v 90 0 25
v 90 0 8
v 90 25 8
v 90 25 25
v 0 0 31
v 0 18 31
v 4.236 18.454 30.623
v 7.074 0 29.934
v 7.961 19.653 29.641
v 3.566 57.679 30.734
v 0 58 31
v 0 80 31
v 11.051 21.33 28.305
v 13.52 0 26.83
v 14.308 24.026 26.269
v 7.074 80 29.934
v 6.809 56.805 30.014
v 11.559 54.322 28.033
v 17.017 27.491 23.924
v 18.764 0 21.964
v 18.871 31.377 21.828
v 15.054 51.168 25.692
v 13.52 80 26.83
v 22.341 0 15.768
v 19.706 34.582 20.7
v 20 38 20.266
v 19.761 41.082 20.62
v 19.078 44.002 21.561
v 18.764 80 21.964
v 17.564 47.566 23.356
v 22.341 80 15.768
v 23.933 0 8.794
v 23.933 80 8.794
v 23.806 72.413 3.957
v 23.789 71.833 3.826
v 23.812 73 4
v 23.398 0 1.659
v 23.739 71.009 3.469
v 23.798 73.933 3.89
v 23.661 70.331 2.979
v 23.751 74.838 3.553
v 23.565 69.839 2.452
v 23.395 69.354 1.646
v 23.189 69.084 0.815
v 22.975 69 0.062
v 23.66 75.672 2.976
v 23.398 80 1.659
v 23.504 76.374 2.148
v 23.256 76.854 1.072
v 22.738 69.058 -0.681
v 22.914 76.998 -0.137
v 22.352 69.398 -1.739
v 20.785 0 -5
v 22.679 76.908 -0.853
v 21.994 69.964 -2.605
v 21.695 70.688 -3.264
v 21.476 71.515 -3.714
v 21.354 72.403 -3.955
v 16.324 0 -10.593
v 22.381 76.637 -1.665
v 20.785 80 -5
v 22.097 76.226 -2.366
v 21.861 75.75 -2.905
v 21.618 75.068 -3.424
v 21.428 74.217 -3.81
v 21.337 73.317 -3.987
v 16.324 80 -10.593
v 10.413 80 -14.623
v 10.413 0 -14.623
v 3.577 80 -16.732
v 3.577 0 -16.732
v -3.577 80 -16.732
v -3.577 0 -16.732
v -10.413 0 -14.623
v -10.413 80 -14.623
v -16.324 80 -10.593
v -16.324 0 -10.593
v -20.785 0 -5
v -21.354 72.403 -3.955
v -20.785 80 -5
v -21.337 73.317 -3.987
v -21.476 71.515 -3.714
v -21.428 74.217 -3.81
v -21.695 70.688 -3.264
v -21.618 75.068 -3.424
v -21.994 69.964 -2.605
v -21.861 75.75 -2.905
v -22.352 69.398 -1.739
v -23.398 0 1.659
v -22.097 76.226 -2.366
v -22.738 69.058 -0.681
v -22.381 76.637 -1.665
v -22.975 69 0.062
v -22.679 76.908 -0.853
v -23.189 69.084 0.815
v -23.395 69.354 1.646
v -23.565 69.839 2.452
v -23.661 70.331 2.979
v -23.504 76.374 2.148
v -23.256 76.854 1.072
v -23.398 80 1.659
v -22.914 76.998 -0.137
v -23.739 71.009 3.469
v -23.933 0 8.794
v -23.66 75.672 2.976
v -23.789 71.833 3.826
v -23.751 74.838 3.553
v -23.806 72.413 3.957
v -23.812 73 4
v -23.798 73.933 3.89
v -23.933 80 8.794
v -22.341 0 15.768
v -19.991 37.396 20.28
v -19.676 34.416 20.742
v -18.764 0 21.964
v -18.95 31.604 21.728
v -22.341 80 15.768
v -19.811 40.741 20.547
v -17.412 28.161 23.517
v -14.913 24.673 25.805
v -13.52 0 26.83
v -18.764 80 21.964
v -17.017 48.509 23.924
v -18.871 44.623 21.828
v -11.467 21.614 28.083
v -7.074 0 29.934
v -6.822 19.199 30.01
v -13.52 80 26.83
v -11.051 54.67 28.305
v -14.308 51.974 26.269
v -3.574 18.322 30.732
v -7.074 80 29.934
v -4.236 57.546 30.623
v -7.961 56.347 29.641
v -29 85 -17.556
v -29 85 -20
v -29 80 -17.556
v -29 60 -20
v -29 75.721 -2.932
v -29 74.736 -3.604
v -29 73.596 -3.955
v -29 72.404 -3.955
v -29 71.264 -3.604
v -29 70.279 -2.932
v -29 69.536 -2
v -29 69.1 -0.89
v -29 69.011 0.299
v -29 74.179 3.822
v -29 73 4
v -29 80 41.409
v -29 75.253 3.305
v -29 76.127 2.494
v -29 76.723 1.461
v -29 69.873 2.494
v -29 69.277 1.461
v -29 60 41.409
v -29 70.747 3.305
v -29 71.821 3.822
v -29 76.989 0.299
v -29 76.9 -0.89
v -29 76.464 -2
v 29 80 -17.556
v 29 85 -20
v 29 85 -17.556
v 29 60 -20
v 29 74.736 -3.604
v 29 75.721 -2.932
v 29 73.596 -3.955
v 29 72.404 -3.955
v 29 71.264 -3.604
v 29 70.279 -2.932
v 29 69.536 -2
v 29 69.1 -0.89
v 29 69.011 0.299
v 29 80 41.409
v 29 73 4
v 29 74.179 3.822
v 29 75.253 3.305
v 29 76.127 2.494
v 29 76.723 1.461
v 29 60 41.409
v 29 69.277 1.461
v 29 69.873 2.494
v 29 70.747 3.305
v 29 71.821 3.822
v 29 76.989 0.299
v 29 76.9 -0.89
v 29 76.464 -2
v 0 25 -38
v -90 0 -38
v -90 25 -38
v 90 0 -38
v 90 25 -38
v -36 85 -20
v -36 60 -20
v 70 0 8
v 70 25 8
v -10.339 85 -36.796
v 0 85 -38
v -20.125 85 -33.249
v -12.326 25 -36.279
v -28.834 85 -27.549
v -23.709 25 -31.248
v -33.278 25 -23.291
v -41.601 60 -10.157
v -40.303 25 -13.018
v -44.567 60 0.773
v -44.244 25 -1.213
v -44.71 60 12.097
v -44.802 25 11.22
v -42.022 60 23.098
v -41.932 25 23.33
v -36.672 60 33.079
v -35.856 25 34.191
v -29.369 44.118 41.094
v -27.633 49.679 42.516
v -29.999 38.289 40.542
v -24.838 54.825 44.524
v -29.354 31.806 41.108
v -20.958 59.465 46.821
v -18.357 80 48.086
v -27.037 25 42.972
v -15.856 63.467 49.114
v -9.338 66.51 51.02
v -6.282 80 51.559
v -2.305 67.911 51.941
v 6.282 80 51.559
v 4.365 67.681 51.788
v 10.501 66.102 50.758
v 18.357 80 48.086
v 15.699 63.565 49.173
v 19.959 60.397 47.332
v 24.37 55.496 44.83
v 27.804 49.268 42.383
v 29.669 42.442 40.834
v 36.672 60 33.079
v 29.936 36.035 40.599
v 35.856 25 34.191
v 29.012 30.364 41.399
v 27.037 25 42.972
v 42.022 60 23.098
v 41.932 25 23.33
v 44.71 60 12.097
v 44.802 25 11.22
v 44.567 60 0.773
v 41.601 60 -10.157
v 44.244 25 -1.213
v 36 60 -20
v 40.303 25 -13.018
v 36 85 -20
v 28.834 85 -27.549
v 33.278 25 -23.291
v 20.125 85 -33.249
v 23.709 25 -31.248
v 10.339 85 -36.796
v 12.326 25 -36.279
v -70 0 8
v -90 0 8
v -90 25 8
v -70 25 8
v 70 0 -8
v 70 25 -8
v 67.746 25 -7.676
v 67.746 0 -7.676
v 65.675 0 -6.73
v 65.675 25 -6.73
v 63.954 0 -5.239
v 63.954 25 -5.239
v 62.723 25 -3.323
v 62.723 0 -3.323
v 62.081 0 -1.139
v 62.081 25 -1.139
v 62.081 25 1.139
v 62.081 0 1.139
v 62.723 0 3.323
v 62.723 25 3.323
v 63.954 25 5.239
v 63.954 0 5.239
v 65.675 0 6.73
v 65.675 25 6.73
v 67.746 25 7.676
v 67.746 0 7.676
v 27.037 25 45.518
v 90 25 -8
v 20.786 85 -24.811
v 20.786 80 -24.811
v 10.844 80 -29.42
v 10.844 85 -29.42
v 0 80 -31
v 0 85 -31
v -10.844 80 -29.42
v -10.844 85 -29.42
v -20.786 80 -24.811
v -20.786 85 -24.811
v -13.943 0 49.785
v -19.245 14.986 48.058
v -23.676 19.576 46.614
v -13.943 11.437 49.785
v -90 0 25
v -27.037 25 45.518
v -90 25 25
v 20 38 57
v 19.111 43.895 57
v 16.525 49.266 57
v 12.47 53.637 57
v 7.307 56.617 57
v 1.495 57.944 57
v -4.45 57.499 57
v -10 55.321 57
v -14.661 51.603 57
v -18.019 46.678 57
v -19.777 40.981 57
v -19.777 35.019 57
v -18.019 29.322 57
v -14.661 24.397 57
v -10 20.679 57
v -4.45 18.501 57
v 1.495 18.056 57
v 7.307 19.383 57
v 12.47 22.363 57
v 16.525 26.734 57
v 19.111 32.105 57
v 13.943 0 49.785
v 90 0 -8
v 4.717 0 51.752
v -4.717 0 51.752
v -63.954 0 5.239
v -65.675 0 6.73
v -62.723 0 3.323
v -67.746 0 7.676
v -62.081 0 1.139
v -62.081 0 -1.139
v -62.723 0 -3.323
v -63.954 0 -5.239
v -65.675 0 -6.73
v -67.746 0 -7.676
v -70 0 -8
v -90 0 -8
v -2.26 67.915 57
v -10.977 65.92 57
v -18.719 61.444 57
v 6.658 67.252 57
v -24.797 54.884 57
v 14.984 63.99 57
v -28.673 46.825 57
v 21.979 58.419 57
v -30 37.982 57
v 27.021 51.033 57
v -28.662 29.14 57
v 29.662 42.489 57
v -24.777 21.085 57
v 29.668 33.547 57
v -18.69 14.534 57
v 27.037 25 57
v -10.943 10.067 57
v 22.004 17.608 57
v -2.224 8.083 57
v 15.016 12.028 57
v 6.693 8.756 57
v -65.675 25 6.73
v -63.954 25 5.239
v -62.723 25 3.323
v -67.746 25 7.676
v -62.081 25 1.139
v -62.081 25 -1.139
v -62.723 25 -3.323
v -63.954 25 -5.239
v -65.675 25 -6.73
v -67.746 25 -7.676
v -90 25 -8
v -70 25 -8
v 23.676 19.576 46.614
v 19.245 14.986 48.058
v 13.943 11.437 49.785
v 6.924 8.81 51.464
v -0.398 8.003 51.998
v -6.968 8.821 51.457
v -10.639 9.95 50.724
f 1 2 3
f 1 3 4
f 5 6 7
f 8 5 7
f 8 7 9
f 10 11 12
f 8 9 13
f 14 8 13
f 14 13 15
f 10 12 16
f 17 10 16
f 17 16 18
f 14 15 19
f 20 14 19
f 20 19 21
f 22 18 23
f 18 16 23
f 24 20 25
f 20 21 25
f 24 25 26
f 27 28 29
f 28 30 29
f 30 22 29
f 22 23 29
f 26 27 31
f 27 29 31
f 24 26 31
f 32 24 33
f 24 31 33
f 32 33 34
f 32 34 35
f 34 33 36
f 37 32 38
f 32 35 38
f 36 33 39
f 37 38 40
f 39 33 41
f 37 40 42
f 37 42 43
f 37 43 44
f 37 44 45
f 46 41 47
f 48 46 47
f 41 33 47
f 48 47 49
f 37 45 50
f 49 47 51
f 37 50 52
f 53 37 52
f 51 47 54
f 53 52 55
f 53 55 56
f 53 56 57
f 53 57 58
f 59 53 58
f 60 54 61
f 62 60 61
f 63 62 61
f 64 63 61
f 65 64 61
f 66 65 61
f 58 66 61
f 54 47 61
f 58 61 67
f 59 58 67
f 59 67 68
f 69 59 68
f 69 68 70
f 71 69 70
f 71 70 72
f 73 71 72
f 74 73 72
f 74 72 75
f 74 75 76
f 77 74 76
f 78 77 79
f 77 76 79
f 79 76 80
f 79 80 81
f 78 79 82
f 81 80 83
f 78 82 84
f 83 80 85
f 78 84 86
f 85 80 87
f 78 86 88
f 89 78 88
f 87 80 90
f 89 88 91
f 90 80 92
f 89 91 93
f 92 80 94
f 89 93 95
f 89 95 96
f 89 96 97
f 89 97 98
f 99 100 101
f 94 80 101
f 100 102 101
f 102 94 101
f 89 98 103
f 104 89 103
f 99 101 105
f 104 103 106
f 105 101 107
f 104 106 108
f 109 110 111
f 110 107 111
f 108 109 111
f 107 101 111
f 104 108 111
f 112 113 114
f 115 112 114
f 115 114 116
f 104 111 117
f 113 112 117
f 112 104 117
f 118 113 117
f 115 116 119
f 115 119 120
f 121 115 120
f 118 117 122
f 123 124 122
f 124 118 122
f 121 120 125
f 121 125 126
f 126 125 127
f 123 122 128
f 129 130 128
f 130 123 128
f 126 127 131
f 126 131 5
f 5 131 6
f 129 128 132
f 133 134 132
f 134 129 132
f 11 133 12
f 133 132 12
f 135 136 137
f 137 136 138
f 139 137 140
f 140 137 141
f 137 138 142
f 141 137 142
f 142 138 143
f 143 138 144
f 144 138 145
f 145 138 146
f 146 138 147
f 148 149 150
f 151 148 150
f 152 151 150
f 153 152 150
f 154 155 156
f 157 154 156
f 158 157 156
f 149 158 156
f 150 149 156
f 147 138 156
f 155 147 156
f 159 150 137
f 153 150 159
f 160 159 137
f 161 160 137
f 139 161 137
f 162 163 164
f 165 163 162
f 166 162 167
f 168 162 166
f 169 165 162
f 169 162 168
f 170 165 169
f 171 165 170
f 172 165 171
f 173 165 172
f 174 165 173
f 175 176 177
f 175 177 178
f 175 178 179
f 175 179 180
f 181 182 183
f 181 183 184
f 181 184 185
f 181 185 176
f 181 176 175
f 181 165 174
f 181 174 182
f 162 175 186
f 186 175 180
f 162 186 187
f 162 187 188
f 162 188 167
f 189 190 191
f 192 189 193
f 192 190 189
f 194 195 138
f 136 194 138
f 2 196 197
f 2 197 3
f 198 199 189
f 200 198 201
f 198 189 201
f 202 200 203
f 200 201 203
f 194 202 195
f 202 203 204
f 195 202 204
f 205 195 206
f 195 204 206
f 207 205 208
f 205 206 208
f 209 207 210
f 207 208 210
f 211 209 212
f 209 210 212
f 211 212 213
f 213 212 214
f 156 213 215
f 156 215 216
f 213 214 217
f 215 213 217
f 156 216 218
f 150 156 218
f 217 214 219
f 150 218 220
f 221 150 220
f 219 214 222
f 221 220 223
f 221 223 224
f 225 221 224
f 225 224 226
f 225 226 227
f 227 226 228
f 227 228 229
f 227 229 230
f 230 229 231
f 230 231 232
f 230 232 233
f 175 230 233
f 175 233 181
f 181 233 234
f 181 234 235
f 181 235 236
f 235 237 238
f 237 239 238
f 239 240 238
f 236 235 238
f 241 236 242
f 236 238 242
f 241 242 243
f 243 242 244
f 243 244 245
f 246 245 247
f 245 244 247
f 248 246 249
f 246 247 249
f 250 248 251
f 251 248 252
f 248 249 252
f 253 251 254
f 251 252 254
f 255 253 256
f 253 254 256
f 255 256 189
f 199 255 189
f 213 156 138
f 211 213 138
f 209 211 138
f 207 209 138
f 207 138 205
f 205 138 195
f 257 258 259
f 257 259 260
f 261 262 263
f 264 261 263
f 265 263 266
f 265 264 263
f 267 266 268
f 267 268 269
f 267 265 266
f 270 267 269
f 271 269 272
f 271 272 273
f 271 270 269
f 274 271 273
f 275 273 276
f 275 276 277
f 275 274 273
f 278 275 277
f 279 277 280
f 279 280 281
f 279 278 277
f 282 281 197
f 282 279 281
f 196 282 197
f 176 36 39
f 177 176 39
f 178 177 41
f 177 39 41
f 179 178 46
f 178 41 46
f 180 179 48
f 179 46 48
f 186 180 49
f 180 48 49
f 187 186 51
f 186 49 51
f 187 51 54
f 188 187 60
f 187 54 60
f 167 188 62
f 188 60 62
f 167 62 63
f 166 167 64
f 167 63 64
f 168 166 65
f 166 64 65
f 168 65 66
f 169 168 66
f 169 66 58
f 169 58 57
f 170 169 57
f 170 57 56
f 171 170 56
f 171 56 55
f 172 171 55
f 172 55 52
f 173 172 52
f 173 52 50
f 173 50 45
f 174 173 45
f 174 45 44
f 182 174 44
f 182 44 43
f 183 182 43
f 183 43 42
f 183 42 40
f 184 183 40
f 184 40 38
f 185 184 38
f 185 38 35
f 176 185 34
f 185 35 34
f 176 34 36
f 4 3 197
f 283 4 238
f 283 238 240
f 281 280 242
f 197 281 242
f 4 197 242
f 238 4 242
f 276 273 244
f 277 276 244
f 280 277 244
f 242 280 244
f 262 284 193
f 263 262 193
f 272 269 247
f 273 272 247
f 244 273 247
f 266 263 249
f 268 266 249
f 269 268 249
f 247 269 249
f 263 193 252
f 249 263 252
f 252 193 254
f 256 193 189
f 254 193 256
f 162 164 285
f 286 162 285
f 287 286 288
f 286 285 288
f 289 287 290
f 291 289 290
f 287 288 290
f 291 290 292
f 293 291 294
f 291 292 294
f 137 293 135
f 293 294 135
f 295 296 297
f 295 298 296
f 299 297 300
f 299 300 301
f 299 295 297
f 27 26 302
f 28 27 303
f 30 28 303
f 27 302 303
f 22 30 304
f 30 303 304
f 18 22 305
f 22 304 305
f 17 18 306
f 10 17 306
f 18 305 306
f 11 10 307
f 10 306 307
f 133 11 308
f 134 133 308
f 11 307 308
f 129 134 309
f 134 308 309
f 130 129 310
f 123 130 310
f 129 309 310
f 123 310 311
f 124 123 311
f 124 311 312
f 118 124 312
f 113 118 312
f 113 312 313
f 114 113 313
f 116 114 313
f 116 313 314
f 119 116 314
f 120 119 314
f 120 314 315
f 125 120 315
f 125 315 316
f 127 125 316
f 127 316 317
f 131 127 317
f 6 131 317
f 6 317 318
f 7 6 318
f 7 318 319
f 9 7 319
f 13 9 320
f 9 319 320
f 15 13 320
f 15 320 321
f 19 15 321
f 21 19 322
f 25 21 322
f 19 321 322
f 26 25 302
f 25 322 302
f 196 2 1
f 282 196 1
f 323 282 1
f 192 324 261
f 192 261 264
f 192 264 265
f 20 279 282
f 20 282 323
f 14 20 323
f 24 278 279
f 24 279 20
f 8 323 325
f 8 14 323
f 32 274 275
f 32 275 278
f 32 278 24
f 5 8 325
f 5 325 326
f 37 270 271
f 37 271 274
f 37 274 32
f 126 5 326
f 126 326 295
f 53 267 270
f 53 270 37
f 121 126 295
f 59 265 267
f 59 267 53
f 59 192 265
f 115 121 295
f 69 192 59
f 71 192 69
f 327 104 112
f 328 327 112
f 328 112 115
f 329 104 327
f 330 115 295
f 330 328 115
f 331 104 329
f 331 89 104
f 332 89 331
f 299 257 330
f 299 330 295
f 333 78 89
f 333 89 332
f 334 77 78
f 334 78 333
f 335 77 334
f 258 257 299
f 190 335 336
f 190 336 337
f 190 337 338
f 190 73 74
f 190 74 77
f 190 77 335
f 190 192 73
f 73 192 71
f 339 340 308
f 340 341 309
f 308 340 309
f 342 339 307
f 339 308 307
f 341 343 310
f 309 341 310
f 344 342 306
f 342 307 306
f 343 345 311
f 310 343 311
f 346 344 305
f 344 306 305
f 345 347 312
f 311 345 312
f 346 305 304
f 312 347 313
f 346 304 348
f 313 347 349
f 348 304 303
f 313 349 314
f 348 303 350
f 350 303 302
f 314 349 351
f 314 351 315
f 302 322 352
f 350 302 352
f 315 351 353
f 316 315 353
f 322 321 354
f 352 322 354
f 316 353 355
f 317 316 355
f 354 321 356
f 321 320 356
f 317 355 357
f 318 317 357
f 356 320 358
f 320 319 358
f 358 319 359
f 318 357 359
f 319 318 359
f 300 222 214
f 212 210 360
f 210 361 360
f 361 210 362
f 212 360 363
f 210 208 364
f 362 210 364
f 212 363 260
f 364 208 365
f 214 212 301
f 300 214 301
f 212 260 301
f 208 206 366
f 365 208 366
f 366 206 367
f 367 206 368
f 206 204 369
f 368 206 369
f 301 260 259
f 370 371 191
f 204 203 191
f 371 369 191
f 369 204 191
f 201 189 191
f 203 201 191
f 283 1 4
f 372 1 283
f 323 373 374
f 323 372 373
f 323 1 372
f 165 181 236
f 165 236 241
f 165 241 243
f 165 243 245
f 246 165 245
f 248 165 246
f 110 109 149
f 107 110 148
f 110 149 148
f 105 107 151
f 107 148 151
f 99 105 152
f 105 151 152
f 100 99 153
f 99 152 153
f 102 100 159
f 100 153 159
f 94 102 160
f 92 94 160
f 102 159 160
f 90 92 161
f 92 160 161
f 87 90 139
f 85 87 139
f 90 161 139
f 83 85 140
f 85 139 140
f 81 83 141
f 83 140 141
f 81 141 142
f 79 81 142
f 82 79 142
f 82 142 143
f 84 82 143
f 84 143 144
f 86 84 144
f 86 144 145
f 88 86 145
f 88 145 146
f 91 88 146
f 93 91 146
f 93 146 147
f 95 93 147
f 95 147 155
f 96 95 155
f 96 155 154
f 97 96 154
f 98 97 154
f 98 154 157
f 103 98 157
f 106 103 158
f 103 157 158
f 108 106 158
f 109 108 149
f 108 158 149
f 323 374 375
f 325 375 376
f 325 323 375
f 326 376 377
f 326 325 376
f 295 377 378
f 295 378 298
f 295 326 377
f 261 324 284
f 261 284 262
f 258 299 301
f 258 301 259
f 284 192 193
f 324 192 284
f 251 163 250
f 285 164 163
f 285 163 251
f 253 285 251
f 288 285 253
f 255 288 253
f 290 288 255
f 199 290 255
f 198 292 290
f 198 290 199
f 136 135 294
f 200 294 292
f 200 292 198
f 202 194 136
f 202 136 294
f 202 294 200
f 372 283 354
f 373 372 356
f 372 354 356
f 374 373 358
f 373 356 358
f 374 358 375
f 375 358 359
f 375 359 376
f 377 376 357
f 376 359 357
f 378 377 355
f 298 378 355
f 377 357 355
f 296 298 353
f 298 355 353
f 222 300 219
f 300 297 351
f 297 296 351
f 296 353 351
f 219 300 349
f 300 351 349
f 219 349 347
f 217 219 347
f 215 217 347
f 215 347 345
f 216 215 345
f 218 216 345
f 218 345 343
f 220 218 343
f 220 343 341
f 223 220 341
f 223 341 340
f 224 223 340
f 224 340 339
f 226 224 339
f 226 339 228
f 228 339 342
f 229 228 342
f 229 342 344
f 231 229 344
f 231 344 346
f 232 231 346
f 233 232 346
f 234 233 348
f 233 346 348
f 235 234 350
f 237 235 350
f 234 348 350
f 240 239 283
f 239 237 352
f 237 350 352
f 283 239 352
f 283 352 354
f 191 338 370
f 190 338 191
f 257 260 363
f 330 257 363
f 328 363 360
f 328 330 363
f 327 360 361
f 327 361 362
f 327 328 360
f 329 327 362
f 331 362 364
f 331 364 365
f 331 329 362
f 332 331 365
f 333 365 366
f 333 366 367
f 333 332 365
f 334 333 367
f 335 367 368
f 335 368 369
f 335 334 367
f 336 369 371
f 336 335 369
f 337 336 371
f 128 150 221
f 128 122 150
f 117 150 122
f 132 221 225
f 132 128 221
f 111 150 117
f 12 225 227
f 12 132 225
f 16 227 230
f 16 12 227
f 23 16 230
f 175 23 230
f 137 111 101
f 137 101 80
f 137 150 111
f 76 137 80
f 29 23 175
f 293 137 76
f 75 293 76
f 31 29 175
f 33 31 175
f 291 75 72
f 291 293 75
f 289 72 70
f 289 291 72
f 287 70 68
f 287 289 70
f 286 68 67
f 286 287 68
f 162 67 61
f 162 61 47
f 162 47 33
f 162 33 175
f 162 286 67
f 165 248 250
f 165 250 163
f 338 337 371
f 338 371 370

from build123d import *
from build123d.topology import SkipClean

# Parameters (mm, degrees)
EXTRUDE_1_DEPTH          = 25
SKETCH_2_R               = 45
EXTRUDE_2_DEPTH          = 60
SKETCH_3_R               = 38
CUT_EXTRUDE_1_DEPTH      = 5
SKETCH_4_R               = 24
CUT_EXTRUDE_2_DEPTH      = 132.164019457
CUT_EXTRUDE_3_DEPTH      = 121.016665509
SKETCH_7_W               = 96.437930536
SKETCH_7_H               = 64.787813211
CUT_EXTRUDE_4_DEPTH      = 132.164019457
SKETCH_8_R               = 4
CUT_EXTRUDE_5_DEPTH      = 156.20953579
EXTRUDE_3_REACH          = 158.045
SKETCH_9_R               = 30
CUT_EXTRUDE_6_REACH      = 158.045
CUT_EXTRUDE_6_END_RADIUS = 24
SKETCH_10_R              = 20


with BuildPart() as part:
    # 草图1 → 凸台-拉伸1 (new body)
    with BuildSketch(Plane(origin=(0, 0, 0), x_dir=(1, 0, 0), z_dir=(0, 1, 0))):
        with BuildLine():
            Line((-90, 38), (90, 38))
            Line((90, 38), (90, 8))
            Line((90, 8), (70, 8))
            ThreePointArc((70, 8), (62, 0), (70, -8))
            Line((70, -8), (90, -8))
            Line((90, -8), (90, -25))
            Line((90, -25), (13.942908677, -49.785456613))
            ThreePointArc((13.942908677, -49.785456613), (0, -52), (-13.942908677, -49.785456613))
            Line((-13.942908677, -49.785456613), (-90, -25))
            Line((-90, -25), (-90, -8))
            Line((-90, -8), (-70, -8))
            ThreePointArc((-70, -8), (-62, 0), (-70, 8))
            Line((-70, 8), (-90, 8))
            Line((-90, 8), (-90, 38))
        make_face()
    extrude(amount=EXTRUDE_1_DEPTH)

    # 草图2 → 凸台-拉伸2 (add)
    with SkipClean():  # the faces are left unmerged after this step: merging them gives an invalid solid
        with BuildSketch(Plane(origin=(0, 25, 0), x_dir=(1, 0, 0), z_dir=(0, 1, 0))):
            with Locations(Location((0, -7, 0), (0, 0, 90))):
                Circle(SKETCH_2_R)
        extrude(amount=EXTRUDE_2_DEPTH)

    # 草图3 → 切除-拉伸1 (cut)
    with SkipClean():  # the faces are left unmerged after this step: merging them gives an invalid solid
        with BuildSketch(Plane(origin=(0, 85, 0), x_dir=(1, 0, 0), z_dir=(0, 1, 0))):
            with Locations(Location((0, -7, 0), (0, 0, 270))):
                Circle(SKETCH_3_R)
        extrude(amount=-CUT_EXTRUDE_1_DEPTH, mode=Mode.SUBTRACT)

    # 草图4 → 切除-拉伸2 (cut, through all)
    with SkipClean():  # the faces are left unmerged after this step: merging them gives an invalid solid
        with BuildSketch(Plane(origin=(0, 80, 0), x_dir=(1, 0, 0), z_dir=(0, 1, 0))):
            with Locations(Location((0, -7, 0), (0, 0, 270))):
                Circle(SKETCH_4_R)
        extrude(amount=-CUT_EXTRUDE_2_DEPTH, mode=Mode.SUBTRACT)

    # 草图5 → 切除-拉伸3 (cut, through all)
    with SkipClean():  # the faces are left unmerged after this step: merging them gives an invalid solid
        with BuildSketch(Plane(origin=(0, 60, 0), x_dir=(1, 0, 0), z_dir=(0, 1, 0))):
            with BuildLine():
                Line((-29, 20), (-29, -41.409301068))
                ThreePointArc((-29, -41.409301068), (-44.710463702, -12.096512099), (-36, 20))
                Line((-36, 20), (-29, 20))
            make_face()
            with BuildLine():
                Line((29, 20), (29, -41.409301068))
                ThreePointArc((29, -41.409301068), (44.710463702, -12.096512099), (36, 20))
                Line((36, 20), (29, 20))
            make_face()
        extrude(amount=CUT_EXTRUDE_3_DEPTH, mode=Mode.SUBTRACT)

    # 草图7 → 切除-拉伸4 (cut, through all)
    with SkipClean():  # the faces are left unmerged after this step: merging them gives an invalid solid
        with BuildSketch(Plane(origin=(0, 80, 0), x_dir=(1, 0, 0), z_dir=(0, 1, 0))):
            with Locations((0.609746756, -32.393906605)):
                Rectangle(SKETCH_7_W, SKETCH_7_H)
        extrude(amount=CUT_EXTRUDE_4_DEPTH, mode=Mode.SUBTRACT)

    # 草图8 → 切除-拉伸5 (cut, through all)
    with SkipClean():  # the faces are left unmerged after this step: merging them gives an invalid solid
        with BuildSketch(Plane.ZY.offset(29)):
            with Locations((0, 73)):
                Circle(SKETCH_8_R)
        extrude(amount=-CUT_EXTRUDE_5_DEPTH, mode=Mode.SUBTRACT)

    # 草图9 → 凸台-拉伸3 (add, up to next)
    with BuildSketch(Plane(origin=(0, 0, 57), x_dir=(-1, 0, 0), z_dir=(0, 0, -1)), mode=Mode.PRIVATE) as extrude_3_sk1:
        with Locations(Location((0, 38, 0), (0, 0, 205.679288619))):
            Circle(SKETCH_9_R)
    extrude_3_tool1 = extrude(extrude_3_sk1.sketch, amount=EXTRUDE_3_REACH, mode=Mode.PRIVATE) - part.part
    add(extrude_3_tool1.solids().sort_by_distance((0, 38, 57))[0])

    # 切除-拉伸6: up to this cylinder (the profile starts outside it)
    cut_extrude_6_end = Plane(origin=(0, 38, 7), z_dir=(0, 1, 0)) * Cylinder(CUT_EXTRUDE_6_END_RADIUS, 365.09, mode=Mode.PRIVATE)
    # 草图10 → 切除-拉伸6 (cut, up to the surface)
    with BuildSketch(Plane.XY.offset(57), mode=Mode.PRIVATE) as cut_extrude_6_sk1:
        with Locations((0, 38)):
            Circle(SKETCH_10_R)
    cut_extrude_6_tool1 = extrude(cut_extrude_6_sk1.sketch, amount=-CUT_EXTRUDE_6_REACH, mode=Mode.PRIVATE) - cut_extrude_6_end
    add(cut_extrude_6_tool1.solids().sort_by_distance((0, 38, 57))[0], mode=Mode.SUBTRACT)


solid = part.part
